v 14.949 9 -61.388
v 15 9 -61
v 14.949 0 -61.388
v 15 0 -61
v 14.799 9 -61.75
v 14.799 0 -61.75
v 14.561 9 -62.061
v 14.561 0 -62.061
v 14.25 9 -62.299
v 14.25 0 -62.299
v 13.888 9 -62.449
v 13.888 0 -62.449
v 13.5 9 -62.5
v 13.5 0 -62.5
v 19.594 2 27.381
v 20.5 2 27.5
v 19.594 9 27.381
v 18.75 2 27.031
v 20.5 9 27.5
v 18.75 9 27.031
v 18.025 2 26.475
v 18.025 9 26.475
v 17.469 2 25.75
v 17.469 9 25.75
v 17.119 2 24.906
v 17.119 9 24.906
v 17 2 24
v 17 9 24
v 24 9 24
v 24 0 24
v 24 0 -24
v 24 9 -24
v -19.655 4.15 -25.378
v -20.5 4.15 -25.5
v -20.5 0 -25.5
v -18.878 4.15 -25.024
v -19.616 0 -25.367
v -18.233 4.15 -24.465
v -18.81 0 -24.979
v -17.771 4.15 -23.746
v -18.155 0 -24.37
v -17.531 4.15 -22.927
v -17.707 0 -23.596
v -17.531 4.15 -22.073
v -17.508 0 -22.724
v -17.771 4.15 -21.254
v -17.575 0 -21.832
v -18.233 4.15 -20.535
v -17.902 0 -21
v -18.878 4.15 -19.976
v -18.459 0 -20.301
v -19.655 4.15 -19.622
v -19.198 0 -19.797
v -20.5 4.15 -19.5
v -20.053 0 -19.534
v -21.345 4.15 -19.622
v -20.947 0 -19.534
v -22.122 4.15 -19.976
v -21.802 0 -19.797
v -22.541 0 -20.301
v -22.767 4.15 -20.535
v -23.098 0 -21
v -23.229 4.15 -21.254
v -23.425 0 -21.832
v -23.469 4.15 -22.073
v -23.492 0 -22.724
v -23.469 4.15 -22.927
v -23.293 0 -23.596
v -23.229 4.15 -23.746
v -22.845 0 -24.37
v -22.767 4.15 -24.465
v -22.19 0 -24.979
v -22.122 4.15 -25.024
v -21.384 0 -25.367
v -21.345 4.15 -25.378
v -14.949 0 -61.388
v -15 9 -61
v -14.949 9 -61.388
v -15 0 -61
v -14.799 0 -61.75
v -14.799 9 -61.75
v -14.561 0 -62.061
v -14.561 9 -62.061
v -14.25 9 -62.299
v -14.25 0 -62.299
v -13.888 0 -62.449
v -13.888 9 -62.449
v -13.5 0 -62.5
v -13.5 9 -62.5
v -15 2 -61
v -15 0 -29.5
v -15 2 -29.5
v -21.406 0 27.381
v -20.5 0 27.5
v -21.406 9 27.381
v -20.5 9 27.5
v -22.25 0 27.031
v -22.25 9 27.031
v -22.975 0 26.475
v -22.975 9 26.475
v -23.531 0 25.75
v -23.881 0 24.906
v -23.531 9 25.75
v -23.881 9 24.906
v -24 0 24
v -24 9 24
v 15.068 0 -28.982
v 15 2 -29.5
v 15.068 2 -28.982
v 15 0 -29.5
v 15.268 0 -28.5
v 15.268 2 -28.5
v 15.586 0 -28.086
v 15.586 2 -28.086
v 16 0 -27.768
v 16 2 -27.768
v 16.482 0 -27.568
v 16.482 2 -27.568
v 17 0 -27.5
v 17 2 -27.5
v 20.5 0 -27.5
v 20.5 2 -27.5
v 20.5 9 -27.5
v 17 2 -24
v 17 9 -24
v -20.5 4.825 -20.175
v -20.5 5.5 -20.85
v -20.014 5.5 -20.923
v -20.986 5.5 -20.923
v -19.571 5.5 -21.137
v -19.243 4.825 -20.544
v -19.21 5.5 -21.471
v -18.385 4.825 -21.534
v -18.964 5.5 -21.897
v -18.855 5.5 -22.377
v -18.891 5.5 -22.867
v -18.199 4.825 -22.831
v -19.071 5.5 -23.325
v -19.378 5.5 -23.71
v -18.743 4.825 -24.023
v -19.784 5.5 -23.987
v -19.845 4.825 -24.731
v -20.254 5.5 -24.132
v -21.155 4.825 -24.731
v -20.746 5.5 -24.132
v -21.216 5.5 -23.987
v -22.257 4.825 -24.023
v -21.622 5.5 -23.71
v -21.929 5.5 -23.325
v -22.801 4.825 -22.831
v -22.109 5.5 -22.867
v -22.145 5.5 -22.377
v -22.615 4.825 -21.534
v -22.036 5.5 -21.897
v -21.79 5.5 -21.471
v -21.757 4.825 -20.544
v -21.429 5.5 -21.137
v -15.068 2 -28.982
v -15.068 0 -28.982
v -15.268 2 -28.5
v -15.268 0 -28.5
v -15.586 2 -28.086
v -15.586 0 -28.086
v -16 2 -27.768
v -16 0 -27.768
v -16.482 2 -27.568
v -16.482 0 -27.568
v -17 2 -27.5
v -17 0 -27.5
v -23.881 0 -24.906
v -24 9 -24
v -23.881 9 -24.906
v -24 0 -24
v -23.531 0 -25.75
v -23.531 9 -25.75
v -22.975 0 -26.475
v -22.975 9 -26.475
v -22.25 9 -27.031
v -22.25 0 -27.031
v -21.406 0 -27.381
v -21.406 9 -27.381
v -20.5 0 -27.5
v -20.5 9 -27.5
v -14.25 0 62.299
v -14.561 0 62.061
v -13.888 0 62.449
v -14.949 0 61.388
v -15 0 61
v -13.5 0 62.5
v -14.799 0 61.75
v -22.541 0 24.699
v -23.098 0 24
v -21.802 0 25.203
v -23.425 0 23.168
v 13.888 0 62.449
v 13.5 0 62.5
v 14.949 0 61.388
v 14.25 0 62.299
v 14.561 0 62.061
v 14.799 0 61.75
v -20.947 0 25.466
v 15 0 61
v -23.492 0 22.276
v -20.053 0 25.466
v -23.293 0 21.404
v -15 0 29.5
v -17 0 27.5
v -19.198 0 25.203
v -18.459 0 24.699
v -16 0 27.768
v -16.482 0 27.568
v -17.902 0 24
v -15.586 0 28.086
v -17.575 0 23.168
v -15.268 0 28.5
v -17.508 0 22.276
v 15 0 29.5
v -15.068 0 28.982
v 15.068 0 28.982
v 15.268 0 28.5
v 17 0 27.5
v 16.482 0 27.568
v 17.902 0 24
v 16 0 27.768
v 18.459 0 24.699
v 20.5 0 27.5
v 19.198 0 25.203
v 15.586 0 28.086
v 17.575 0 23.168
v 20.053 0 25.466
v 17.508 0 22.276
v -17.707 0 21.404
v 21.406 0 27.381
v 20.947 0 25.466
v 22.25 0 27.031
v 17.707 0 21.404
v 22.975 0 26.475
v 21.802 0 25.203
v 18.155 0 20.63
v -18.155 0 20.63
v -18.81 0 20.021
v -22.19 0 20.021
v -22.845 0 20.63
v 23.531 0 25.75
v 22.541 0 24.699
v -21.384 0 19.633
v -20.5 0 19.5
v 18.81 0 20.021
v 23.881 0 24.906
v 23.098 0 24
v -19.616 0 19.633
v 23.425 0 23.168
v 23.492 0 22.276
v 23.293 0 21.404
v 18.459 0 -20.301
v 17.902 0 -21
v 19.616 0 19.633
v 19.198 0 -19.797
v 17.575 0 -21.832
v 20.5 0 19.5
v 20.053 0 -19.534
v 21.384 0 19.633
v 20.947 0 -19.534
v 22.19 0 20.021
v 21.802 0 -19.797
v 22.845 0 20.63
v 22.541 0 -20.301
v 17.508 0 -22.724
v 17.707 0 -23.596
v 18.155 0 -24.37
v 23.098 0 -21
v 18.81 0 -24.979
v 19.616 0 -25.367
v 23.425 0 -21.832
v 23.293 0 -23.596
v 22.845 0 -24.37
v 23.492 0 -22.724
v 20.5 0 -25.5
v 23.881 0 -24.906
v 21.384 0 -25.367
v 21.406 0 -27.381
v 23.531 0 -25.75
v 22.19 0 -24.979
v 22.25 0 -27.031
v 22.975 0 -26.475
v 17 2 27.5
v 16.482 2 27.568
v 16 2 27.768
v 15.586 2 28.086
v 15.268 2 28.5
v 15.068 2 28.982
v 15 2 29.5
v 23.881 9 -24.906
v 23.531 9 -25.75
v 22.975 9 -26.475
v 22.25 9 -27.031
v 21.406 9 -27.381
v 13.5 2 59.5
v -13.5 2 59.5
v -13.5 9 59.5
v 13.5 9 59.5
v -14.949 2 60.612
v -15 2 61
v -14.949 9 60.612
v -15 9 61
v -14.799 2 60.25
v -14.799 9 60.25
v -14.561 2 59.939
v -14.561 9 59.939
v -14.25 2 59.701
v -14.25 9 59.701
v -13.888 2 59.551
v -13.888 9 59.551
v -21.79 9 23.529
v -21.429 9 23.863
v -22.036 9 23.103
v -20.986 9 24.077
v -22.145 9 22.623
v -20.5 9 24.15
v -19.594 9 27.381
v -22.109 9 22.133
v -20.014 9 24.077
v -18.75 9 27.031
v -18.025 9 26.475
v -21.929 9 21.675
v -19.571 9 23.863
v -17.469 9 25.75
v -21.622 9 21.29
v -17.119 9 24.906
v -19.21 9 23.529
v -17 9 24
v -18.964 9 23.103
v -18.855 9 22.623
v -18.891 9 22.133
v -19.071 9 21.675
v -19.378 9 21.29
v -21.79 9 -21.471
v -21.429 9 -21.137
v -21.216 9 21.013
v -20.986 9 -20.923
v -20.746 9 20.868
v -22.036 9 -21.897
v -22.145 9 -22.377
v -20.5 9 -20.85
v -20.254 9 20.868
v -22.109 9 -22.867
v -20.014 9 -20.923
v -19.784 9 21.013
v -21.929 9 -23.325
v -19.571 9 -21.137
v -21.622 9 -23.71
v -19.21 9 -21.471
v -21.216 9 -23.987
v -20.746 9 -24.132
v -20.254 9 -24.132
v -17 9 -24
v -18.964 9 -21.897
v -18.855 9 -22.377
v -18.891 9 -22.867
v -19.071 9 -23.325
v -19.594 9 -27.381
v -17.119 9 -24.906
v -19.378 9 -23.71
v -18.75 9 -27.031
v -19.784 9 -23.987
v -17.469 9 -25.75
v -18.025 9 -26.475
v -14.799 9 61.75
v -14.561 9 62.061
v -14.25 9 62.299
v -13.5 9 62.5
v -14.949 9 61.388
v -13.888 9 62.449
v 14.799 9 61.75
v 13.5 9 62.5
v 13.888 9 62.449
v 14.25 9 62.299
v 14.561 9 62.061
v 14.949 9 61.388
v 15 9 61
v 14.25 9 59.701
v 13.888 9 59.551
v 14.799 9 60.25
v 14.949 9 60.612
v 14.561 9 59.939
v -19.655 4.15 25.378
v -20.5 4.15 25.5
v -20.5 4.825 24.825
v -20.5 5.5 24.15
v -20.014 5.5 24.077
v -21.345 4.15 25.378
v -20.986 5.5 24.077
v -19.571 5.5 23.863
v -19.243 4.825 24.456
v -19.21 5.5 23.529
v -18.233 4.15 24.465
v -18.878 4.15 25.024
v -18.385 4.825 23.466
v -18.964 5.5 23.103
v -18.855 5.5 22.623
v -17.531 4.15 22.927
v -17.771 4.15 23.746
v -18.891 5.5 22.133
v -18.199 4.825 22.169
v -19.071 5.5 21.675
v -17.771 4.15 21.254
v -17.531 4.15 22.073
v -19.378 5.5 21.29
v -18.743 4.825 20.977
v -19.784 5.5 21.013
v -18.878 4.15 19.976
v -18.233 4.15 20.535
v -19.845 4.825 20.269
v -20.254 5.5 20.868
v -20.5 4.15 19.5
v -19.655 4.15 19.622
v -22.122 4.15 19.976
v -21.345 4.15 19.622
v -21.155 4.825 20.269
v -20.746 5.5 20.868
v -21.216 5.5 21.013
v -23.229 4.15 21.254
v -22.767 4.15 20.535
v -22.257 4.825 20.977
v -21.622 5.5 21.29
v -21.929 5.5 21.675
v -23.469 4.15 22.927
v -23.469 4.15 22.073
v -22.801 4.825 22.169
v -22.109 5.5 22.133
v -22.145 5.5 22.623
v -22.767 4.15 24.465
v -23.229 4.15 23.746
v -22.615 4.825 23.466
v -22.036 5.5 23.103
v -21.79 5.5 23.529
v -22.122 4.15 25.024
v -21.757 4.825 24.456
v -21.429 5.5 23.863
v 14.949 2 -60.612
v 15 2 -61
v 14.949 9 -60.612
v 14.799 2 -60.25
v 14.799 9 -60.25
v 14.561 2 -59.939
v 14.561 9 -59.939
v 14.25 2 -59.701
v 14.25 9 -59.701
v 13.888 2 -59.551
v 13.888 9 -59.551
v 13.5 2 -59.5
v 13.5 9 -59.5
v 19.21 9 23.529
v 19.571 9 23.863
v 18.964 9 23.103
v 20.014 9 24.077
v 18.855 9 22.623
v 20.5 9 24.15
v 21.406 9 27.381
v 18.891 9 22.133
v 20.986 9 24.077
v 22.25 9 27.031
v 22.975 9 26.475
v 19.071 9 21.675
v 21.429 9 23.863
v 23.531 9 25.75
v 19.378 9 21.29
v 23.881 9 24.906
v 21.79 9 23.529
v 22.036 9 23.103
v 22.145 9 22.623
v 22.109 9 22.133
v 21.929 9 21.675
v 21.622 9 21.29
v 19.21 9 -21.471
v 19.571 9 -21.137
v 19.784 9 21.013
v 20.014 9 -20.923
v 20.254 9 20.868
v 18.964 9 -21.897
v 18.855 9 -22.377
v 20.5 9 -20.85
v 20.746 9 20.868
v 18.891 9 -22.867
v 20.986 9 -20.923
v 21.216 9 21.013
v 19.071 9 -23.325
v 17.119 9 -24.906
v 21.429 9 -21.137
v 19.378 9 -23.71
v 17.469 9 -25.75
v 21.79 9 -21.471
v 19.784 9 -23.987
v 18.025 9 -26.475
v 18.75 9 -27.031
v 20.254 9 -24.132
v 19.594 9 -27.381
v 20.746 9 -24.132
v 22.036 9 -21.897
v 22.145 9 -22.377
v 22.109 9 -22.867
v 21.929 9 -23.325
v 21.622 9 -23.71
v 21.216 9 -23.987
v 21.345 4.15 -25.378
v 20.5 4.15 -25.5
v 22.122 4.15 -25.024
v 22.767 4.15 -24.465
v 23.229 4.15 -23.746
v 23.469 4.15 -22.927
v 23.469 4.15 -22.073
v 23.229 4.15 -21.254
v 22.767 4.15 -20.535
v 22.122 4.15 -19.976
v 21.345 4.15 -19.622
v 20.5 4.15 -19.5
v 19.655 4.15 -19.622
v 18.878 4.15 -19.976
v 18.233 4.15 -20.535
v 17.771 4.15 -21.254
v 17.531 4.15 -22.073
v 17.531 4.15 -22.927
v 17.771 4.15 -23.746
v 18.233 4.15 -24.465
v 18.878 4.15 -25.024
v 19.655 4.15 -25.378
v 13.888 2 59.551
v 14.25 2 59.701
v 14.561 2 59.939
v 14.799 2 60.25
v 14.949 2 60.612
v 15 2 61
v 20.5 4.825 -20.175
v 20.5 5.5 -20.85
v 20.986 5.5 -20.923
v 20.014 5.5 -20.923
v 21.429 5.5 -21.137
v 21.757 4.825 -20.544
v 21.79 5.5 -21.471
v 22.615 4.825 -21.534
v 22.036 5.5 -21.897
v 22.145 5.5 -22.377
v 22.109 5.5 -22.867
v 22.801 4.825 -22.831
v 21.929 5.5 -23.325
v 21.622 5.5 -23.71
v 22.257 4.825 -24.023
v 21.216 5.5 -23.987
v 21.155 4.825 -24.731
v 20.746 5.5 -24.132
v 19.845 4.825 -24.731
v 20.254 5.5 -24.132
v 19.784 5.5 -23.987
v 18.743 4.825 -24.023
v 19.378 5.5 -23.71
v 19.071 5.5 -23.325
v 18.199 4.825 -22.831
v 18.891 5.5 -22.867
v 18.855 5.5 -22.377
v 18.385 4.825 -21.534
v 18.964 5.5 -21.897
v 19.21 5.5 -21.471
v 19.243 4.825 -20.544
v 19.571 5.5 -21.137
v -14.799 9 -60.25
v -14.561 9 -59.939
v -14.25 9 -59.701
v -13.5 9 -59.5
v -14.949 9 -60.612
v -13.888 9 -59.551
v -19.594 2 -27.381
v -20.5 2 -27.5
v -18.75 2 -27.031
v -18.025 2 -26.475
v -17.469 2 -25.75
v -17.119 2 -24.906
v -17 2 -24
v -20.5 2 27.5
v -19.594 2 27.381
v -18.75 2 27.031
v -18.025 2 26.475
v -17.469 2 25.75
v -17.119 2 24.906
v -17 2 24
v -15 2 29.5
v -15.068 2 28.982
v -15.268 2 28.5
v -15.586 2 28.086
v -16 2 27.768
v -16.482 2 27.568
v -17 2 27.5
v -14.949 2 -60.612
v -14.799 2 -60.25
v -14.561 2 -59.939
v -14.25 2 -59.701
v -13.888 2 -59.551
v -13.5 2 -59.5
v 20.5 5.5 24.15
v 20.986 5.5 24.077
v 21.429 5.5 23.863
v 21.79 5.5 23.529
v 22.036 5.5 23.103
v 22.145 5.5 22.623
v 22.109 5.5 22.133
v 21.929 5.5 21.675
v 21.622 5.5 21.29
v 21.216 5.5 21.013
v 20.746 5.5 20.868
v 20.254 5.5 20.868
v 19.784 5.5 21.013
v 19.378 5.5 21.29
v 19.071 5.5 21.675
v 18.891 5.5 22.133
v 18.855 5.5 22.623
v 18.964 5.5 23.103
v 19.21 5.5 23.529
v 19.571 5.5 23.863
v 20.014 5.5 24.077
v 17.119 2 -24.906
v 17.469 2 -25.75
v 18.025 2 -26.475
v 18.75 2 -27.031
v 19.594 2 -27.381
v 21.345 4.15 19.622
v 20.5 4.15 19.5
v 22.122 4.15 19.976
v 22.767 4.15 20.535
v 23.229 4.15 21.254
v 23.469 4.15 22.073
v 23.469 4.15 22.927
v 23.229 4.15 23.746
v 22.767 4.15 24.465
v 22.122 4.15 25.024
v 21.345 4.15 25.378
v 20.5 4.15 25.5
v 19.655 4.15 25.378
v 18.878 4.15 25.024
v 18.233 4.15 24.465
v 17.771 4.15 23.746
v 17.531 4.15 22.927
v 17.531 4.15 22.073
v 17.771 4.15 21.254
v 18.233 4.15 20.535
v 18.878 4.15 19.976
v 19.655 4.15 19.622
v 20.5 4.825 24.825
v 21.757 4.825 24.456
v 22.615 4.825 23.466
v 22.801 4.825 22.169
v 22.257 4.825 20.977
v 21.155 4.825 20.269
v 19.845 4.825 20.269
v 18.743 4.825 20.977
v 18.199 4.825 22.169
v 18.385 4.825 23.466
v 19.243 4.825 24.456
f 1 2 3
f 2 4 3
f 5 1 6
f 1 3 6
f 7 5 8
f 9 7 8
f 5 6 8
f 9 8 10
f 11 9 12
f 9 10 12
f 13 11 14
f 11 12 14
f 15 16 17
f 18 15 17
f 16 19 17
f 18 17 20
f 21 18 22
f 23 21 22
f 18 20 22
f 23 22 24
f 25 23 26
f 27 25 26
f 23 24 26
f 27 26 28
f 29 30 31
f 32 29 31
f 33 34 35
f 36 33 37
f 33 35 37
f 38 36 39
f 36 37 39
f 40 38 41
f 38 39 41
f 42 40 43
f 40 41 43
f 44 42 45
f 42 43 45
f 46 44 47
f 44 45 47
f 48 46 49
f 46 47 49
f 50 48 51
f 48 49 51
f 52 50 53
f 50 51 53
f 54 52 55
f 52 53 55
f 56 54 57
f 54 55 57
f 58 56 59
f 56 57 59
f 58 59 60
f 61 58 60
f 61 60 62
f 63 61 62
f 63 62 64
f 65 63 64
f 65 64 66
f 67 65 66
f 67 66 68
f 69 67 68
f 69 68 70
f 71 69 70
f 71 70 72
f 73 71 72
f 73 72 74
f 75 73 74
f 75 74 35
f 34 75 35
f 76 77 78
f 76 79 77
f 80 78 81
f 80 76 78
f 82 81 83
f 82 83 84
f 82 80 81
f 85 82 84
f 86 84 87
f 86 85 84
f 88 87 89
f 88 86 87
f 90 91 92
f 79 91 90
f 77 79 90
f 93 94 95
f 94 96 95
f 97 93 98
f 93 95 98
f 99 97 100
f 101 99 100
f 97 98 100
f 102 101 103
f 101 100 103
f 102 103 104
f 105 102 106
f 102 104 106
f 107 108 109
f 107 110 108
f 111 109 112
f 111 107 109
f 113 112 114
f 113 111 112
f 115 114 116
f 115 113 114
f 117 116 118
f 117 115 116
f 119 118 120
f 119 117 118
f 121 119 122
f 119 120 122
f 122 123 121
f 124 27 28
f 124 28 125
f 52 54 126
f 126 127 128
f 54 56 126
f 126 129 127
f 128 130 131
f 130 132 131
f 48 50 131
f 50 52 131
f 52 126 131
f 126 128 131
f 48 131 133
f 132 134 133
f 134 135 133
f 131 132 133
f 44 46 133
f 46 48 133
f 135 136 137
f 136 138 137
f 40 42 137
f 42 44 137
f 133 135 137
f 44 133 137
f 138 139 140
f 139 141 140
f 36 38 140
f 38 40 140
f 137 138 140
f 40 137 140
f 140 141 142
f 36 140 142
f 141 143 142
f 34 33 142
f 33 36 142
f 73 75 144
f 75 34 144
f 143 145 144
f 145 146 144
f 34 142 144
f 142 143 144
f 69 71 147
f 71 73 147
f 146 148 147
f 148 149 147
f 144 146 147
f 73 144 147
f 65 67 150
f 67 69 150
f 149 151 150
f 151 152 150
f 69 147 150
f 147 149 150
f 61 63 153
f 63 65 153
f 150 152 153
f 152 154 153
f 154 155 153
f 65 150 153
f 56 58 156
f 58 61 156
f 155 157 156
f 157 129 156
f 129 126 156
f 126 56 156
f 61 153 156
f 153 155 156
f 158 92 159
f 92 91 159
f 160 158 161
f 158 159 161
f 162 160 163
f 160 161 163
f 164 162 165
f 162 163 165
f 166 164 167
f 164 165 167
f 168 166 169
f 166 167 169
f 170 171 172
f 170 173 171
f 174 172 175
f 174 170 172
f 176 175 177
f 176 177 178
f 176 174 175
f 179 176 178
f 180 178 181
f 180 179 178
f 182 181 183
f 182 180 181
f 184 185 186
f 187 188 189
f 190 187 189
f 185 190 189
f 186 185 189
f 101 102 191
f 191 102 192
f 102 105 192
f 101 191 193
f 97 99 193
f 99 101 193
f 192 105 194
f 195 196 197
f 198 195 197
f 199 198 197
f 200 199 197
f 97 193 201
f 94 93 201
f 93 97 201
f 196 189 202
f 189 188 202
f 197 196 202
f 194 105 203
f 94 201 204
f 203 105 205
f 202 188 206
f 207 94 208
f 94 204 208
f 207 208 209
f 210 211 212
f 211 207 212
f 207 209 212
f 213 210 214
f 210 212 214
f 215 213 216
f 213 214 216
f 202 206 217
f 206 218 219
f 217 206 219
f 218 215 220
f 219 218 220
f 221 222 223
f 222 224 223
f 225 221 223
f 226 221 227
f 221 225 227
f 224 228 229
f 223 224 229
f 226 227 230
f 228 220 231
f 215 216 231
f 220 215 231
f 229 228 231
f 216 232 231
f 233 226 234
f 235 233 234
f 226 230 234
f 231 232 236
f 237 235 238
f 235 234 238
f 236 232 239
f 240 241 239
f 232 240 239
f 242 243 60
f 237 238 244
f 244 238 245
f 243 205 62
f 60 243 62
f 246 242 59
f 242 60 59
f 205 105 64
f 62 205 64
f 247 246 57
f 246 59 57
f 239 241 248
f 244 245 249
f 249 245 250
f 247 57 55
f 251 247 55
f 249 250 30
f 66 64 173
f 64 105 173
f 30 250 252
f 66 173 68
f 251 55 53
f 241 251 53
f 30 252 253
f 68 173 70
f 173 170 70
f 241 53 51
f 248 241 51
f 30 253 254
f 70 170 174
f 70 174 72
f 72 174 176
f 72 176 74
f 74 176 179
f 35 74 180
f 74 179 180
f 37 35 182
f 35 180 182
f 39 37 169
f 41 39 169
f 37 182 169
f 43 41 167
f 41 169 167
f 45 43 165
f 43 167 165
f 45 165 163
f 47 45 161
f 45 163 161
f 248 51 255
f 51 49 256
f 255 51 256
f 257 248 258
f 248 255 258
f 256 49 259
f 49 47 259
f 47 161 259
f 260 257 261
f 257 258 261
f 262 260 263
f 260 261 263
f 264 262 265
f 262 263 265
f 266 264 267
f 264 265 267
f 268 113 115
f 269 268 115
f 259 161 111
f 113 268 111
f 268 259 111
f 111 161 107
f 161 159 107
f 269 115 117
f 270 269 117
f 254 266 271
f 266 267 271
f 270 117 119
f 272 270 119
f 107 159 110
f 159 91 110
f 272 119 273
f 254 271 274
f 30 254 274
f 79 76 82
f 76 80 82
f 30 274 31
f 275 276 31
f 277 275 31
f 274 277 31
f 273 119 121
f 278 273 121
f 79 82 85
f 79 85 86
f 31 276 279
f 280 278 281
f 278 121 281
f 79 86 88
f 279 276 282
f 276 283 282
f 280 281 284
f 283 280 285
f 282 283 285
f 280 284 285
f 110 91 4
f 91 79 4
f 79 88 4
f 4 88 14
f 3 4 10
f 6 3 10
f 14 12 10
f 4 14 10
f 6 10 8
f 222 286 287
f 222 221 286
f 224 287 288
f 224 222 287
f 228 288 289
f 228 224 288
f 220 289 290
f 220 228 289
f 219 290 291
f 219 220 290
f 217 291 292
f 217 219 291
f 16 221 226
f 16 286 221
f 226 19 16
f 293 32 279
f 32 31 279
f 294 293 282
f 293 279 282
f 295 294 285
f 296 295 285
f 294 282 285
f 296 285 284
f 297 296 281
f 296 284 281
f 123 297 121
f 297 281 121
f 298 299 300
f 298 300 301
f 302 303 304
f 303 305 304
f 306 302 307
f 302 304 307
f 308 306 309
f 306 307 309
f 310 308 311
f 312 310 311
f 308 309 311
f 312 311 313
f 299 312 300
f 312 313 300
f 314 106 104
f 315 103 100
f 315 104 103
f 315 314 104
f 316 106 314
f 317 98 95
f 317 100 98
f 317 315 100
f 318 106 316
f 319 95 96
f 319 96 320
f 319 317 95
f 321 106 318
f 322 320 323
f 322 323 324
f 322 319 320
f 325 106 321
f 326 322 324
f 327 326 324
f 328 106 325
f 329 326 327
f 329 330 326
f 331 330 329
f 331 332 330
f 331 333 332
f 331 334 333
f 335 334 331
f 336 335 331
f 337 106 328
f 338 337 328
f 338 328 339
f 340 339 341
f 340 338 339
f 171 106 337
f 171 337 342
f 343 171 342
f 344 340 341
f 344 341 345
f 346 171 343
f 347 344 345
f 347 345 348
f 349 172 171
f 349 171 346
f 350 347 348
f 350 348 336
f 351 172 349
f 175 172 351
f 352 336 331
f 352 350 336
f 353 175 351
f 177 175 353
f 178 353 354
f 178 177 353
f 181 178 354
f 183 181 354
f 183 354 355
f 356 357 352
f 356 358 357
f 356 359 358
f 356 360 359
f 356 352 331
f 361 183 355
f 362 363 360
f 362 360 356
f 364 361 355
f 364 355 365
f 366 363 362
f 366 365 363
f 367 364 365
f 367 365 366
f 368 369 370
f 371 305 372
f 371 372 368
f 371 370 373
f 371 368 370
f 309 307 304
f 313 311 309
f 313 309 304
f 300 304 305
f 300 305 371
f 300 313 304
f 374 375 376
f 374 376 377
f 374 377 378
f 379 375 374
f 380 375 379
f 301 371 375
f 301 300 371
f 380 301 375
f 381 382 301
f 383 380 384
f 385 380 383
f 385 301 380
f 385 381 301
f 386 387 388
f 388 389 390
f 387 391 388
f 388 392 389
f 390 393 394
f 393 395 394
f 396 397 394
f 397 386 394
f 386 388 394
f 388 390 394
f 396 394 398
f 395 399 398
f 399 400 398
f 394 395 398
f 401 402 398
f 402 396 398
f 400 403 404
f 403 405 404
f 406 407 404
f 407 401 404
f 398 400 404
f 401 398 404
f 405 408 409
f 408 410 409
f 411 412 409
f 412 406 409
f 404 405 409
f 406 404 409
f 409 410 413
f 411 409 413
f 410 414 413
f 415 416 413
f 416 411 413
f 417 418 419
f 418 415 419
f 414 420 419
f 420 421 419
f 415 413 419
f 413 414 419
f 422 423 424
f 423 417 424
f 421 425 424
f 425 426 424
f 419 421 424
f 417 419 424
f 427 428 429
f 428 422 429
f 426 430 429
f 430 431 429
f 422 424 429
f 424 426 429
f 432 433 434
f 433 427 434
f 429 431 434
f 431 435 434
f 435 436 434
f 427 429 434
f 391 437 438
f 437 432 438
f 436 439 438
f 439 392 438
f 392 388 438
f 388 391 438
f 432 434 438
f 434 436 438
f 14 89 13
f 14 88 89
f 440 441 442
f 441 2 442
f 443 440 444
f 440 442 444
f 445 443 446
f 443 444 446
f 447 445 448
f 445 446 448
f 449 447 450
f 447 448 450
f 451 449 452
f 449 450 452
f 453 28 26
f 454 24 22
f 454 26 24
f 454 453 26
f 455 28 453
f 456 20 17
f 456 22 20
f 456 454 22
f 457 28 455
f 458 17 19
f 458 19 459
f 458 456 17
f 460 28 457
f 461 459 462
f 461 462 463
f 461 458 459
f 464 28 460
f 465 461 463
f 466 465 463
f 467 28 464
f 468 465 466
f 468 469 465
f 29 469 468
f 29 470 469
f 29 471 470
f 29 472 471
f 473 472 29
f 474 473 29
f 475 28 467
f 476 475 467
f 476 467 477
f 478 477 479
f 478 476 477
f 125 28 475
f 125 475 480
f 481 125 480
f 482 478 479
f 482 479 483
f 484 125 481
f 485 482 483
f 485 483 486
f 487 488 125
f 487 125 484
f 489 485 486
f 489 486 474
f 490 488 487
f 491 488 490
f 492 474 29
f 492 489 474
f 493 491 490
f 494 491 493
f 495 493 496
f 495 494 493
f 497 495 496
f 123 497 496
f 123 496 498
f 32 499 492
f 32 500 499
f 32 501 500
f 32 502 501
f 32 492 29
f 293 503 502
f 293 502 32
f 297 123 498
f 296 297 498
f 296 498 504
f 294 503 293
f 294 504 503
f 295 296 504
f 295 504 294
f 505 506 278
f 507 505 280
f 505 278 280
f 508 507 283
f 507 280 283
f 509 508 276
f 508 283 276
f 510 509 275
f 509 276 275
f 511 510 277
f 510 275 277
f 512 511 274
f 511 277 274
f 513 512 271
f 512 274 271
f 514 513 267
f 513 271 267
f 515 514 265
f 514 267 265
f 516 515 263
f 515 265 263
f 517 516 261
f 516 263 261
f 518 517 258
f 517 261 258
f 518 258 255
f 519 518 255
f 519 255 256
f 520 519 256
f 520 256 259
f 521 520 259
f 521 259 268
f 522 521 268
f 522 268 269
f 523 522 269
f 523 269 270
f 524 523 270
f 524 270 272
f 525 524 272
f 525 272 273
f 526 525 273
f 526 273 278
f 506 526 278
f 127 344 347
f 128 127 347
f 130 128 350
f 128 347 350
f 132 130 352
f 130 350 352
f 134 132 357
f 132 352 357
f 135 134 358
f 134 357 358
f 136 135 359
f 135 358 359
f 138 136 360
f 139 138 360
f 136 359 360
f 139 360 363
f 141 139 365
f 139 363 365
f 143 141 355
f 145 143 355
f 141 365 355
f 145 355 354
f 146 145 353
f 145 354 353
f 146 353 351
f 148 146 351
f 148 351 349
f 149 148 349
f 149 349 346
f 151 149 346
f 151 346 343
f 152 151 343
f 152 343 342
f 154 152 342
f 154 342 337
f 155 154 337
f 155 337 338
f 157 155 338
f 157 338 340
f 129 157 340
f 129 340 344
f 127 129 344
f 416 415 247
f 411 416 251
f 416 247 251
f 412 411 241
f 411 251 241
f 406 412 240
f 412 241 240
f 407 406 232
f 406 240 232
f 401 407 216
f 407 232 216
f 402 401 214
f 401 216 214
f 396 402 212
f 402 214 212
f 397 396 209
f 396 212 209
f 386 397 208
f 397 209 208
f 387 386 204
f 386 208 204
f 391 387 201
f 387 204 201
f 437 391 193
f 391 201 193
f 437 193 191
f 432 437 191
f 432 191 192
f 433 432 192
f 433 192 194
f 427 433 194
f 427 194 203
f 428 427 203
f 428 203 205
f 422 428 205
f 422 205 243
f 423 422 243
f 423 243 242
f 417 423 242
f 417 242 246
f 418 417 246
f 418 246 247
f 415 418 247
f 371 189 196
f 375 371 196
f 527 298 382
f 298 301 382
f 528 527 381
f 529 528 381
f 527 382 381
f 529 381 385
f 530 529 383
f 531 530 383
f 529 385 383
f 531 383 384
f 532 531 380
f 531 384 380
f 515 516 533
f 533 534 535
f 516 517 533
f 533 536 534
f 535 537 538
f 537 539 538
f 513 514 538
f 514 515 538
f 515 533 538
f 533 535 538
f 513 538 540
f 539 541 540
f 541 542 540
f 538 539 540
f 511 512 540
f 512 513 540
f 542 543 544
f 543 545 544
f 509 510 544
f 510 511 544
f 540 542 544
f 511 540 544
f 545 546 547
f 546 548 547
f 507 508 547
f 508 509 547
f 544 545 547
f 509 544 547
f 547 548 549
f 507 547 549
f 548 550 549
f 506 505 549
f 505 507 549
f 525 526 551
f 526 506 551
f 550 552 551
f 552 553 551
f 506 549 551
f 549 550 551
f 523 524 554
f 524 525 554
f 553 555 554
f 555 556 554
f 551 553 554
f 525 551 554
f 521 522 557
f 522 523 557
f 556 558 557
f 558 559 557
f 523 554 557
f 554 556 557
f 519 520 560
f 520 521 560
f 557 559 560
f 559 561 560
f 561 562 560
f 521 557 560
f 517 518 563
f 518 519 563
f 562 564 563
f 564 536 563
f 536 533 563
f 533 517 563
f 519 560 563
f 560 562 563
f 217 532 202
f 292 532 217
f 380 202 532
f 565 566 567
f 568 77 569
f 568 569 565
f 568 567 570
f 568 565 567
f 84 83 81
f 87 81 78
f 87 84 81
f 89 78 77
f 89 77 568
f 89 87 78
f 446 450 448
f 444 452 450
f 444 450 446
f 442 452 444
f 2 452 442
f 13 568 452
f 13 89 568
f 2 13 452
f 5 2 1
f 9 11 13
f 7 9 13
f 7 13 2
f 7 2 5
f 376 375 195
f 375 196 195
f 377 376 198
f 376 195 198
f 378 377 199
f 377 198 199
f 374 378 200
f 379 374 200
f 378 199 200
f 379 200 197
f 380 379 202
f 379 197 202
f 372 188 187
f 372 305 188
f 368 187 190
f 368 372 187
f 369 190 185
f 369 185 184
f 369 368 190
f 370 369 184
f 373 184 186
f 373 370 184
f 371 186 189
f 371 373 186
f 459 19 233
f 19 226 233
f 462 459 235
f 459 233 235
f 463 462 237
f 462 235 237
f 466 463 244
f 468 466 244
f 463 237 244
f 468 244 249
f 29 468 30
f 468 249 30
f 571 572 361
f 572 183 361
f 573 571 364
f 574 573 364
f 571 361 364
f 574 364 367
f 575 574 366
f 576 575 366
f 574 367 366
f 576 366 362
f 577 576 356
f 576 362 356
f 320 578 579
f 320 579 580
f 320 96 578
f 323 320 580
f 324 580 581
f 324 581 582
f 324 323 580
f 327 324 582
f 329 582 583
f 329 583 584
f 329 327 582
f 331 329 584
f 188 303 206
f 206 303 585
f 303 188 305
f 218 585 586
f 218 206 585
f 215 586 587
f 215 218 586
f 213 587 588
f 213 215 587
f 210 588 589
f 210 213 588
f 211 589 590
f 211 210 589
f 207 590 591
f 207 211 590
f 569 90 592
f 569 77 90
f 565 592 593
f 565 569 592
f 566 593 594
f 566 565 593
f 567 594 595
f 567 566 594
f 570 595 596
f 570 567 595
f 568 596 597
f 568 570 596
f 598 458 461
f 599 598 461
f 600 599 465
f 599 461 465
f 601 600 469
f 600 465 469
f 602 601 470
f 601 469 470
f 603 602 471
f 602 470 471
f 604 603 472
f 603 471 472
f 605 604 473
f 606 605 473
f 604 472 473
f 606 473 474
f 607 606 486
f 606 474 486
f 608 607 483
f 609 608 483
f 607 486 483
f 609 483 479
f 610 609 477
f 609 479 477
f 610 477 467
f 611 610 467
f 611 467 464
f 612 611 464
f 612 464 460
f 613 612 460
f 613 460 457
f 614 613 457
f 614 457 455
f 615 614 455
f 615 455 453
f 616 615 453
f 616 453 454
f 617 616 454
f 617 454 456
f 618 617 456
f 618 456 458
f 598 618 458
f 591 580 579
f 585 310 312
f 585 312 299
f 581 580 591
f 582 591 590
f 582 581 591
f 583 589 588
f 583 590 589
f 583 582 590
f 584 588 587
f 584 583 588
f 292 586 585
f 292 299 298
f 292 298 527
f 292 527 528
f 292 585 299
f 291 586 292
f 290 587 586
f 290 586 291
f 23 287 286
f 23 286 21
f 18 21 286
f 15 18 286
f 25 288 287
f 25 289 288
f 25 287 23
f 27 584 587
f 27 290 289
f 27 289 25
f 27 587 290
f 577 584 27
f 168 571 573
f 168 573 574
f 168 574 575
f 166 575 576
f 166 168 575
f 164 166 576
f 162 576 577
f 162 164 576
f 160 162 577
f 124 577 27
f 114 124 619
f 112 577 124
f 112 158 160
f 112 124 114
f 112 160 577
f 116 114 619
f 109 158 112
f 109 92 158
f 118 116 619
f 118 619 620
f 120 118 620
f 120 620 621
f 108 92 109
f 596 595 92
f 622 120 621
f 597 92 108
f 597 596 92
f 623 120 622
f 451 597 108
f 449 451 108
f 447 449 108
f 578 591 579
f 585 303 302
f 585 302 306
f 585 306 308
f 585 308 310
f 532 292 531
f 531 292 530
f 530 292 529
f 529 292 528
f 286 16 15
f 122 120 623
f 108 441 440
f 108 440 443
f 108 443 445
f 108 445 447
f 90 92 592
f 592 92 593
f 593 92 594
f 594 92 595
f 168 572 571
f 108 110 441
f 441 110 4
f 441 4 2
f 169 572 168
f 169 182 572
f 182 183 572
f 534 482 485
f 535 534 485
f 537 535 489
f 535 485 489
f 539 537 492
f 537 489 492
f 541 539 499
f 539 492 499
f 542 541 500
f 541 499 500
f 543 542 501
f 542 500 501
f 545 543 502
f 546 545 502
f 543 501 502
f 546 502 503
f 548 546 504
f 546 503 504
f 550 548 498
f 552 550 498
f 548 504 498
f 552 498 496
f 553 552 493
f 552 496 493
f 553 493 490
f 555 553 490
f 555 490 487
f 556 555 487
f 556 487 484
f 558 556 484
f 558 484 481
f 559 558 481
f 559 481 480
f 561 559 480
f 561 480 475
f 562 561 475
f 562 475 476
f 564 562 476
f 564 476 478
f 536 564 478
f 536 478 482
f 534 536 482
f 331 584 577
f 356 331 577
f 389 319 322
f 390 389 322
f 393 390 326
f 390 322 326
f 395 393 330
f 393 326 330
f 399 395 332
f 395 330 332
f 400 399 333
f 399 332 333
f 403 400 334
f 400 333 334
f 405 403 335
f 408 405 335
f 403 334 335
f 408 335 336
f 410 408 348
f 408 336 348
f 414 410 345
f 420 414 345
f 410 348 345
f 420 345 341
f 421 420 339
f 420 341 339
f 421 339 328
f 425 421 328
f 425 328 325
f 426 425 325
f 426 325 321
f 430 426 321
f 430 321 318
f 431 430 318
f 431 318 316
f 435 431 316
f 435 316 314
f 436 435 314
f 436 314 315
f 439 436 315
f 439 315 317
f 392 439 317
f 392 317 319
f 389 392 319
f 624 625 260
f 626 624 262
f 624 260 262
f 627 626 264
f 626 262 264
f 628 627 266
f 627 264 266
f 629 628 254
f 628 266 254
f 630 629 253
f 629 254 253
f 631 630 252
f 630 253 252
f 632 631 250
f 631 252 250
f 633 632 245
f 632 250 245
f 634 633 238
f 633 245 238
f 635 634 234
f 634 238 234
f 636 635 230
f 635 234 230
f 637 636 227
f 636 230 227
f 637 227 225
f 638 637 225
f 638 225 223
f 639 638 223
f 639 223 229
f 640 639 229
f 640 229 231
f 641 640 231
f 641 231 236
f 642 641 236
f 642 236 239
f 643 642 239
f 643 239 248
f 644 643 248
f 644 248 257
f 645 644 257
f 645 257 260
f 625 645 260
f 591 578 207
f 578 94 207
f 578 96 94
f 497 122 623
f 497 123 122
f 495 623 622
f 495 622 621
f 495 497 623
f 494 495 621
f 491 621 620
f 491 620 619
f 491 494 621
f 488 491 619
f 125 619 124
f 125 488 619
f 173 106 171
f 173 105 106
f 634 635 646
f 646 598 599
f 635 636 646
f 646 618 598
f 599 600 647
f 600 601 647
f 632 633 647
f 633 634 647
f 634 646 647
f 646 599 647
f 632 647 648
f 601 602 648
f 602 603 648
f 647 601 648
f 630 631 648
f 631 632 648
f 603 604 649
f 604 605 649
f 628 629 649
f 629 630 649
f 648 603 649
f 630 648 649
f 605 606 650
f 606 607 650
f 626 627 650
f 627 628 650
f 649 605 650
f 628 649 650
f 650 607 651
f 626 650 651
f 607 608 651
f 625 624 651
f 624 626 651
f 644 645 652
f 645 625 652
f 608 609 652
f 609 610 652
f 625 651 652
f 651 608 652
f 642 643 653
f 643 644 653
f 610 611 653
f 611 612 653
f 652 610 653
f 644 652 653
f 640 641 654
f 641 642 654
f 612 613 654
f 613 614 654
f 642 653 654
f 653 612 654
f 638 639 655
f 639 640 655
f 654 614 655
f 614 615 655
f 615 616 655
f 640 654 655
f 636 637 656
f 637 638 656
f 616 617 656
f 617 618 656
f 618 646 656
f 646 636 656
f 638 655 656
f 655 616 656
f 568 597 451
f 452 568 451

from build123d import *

# Parameters (mm, degrees)
SKETCH_1_W             = 48
SKETCH_1_H             = 125
EXTRUDE_403_DEPTH      = 2
SKETCH_2_W             = 9
SKETCH_2_H             = 35
CUT_EXTRUDE_733_DEPTH  = 67.979474468
SKETCH_3_W             = 7
SKETCH_3_H             = 55
EXTRUDE_1088_DEPTH     = 7
SKETCH_4_W             = 30
SKETCH_4_H             = 3
EXTRUDE_1396_DEPTH     = 7
SKETCH_5_R             = 1.65
CUT_EXTRUDE_1704_DEPTH = 68.551831951
SKETCH_7_R             = 3
CUT_EXTRUDE_2019_DEPTH = 4
CHAMFER_1_SIZE         = 1.5
FILLET_1_R             = 1.5
FILLET_2_R             = 2
FILLET_3_R             = 3.5


# Some blends are built 0.0001 mm under size
with BuildPart() as part:
    # Эскиз1 → Extrude 403 (new body)
    with BuildSketch(Plane(origin=(0, 0, 0), x_dir=(1, 0, 0), z_dir=(0, 1, 0))):
        Rectangle(SKETCH_1_W, SKETCH_1_H)
    extrude(amount=EXTRUDE_403_DEPTH)

    # Эскиз2 → Cut-Extrude 733 (cut, through all)
    with BuildSketch(Plane(origin=(0, 2, 0), x_dir=(1, 0, 0), z_dir=(0, 1, 0))):
        with Locations((-19.5, 45)):
            Rectangle(SKETCH_2_W, SKETCH_2_H)
        with Locations((19.5, 45)):
            Rectangle(SKETCH_2_W, SKETCH_2_H)
        with Locations((19.5, -45)):
            Rectangle(SKETCH_2_W, SKETCH_2_H)
        with Locations((-19.5, -45)):
            Rectangle(SKETCH_2_W, SKETCH_2_H)
    extrude(amount=-CUT_EXTRUDE_733_DEPTH, mode=Mode.SUBTRACT)

    # Эскиз3 → Extrude 1088 (add)
    with BuildSketch(Plane(origin=(0, 2, 0), x_dir=(1, 0, 0), z_dir=(0, 1, 0))):
        with Locations((-20.5, 0)):
            Rectangle(SKETCH_3_W, SKETCH_3_H)
        with Locations((20.5, 0)):
            Rectangle(SKETCH_3_W, SKETCH_3_H)
    extrude(amount=EXTRUDE_1088_DEPTH)

    # Эскиз4 → Extrude 1396 (add)
    with BuildSketch(Plane(origin=(0, 2, 0), x_dir=(1, 0, 0), z_dir=(0, 1, 0))):
        with Locations((0, 61)):
            Rectangle(SKETCH_4_W, SKETCH_4_H)
        with Locations((0, -61)):
            Rectangle(SKETCH_4_W, SKETCH_4_H)
    extrude(amount=EXTRUDE_1396_DEPTH)

    # Эскиз5 → Cut-Extrude 1704 (cut, through all)
    with BuildSketch(Plane(origin=(0, 9, 0), x_dir=(1, 0, 0), z_dir=(0, 1, 0))):
        with Locations(Location((-20.5, 22.5, 0), (0, 0, 270))):
            Circle(SKETCH_5_R)
        with Locations(Location((-20.5, -22.5, 0), (0, 0, 270))):
            Circle(SKETCH_5_R)
        with Locations(Location((20.5, -22.5, 0), (0, 0, 270))):
            Circle(SKETCH_5_R)
        with Locations(Location((20.5, 22.5, 0), (0, 0, 270))):
            Circle(SKETCH_5_R)
    extrude(amount=-CUT_EXTRUDE_1704_DEPTH, mode=Mode.SUBTRACT)

    # Эскиз7 → Cut-Extrude 2019 (cut)
    with BuildSketch(Plane.XZ):
        with Locations(Location((-20.5, 22.5, 0), (0, 0, 270))):
            Circle(SKETCH_7_R)
        with Locations(Location((-20.5, -22.5, 0), (0, 0, 270))):
            Circle(SKETCH_7_R)
        with Locations(Location((20.5, 22.5, 0), (0, 0, 270))):
            Circle(SKETCH_7_R)
        with Locations(Location((20.5, -22.5, 0), (0, 0, 270))):
            Circle(SKETCH_7_R)
    extrude(amount=-CUT_EXTRUDE_2019_DEPTH, mode=Mode.SUBTRACT)

    # Фаска1
    # the kernel refuses this chamfer: 1.5 mm, written as the material it takes off along each edge
    with BuildSketch(Plane(origin=(-20.5, 4, 22.5), x_dir=(0, 0, 1), z_dir=(-1, 0, 0))) as chamfer_1_piece_1_section:
        Polygon((1.65 + CHAMFER_1_SIZE, 0), (1.65, CHAMFER_1_SIZE), (1.65, 0), align=None)
    chamfer_1_piece_1 = revolve(axis=Axis((-20.5, 4, 22.5), (0, 1, 0)), mode=Mode.PRIVATE)
    chamfer_1_piece_1 = chamfer_1_piece_1 & Plane(origin=(-20.5, 4.828305934, 22.5), x_dir=(0, 0, -1), z_dir=(0, -1, 0)) * Cylinder(3, 13, mode=Mode.PRIVATE)
    add(chamfer_1_piece_1, mode=Mode.SUBTRACT)
    with BuildSketch(Plane(origin=(-20.5, 4, -22.5), x_dir=(0, 0, 1), z_dir=(-1, 0, 0))) as chamfer_1_piece_2_section:
        Polygon((1.65 + CHAMFER_1_SIZE, 0), (1.65, CHAMFER_1_SIZE), (1.65, 0), align=None)
    chamfer_1_piece_2 = revolve(axis=Axis((-20.5, 4, -22.5), (0, 1, 0)), mode=Mode.PRIVATE)
    chamfer_1_piece_2 = chamfer_1_piece_2 & Plane(origin=(-20.5, 4.828305934, -22.5), x_dir=(0, 0, -1), z_dir=(0, -1, 0)) * Cylinder(3, 13, mode=Mode.PRIVATE)
    add(chamfer_1_piece_2, mode=Mode.SUBTRACT)
    with BuildSketch(Plane(origin=(20.5, 4, -22.5), x_dir=(0, 0, 1), z_dir=(-1, 0, 0))) as chamfer_1_piece_3_section:
        Polygon((1.65 + CHAMFER_1_SIZE, 0), (1.65, CHAMFER_1_SIZE), (1.65, 0), align=None)
    chamfer_1_piece_3 = revolve(axis=Axis((20.5, 4, -22.5), (0, 1, 0)), mode=Mode.PRIVATE)
    chamfer_1_piece_3 = chamfer_1_piece_3 & Plane(origin=(20.5, 4.828305934, -22.5), x_dir=(0, 0, -1), z_dir=(0, -1, 0)) * Cylinder(3, 13, mode=Mode.PRIVATE)
    add(chamfer_1_piece_3, mode=Mode.SUBTRACT)
    with BuildSketch(Plane(origin=(20.5, 4, 22.5), x_dir=(0, 0, 1), z_dir=(-1, 0, 0))) as chamfer_1_piece_4_section:
        Polygon((1.65 + CHAMFER_1_SIZE, 0), (1.65, CHAMFER_1_SIZE), (1.65, 0), align=None)
    chamfer_1_piece_4 = revolve(axis=Axis((20.5, 4, 22.5), (0, 1, 0)), mode=Mode.PRIVATE)
    chamfer_1_piece_4 = chamfer_1_piece_4 & Plane(origin=(20.5, 4.828305934, 22.5), x_dir=(0, 0, -1), z_dir=(0, -1, 0)) * Cylinder(3, 13, mode=Mode.PRIVATE)
    add(chamfer_1_piece_4, mode=Mode.SUBTRACT)

    # Скругление1
    fillet_1_edges = [part.edges().sort_by_distance(p)[0] for p in [
        (-15, 5.5, 59.5),
        (-15, 4.5, 62.5),
        (15, 4.5, 62.5),
        (15, 5.5, 59.5),
        (15, 4.5, -62.5),
        (15, 5.5, -59.5),
        (-15, 5.5, -59.5),
        (-15, 4.5, -62.5),
    ]]
    fillet(fillet_1_edges, radius=FILLET_1_R - 0.0001)  # a hair under: the kernel refuses the full size

    # Скругление2
    fillet_2_edges = [part.edges().sort_by_distance(p)[0] for p in [
        (15, 1, -27.5),
        (-15, 1, -27.5),
        (-15, 1, 27.5),
        (15, 1, 27.5),
    ]]
    fillet(fillet_2_edges, radius=FILLET_2_R)

    # Скругление3
    fillet_3_edges = [part.edges().sort_by_distance(p)[0] for p in [
        (-17, 5.5, 27.5),
        (-24, 4.5, 27.5),
        (-24, 4.5, -27.5),
        (-17, 5.5, -27.5),
        (24, 4.5, -27.5),
        (17, 5.5, -27.5),
        (17, 5.5, 27.5),
        (24, 4.5, 27.5),
    ]]
    fillet(fillet_3_edges, radius=FILLET_3_R - 0.0001)  # a hair under: the kernel refuses the full size


solid = part.part
